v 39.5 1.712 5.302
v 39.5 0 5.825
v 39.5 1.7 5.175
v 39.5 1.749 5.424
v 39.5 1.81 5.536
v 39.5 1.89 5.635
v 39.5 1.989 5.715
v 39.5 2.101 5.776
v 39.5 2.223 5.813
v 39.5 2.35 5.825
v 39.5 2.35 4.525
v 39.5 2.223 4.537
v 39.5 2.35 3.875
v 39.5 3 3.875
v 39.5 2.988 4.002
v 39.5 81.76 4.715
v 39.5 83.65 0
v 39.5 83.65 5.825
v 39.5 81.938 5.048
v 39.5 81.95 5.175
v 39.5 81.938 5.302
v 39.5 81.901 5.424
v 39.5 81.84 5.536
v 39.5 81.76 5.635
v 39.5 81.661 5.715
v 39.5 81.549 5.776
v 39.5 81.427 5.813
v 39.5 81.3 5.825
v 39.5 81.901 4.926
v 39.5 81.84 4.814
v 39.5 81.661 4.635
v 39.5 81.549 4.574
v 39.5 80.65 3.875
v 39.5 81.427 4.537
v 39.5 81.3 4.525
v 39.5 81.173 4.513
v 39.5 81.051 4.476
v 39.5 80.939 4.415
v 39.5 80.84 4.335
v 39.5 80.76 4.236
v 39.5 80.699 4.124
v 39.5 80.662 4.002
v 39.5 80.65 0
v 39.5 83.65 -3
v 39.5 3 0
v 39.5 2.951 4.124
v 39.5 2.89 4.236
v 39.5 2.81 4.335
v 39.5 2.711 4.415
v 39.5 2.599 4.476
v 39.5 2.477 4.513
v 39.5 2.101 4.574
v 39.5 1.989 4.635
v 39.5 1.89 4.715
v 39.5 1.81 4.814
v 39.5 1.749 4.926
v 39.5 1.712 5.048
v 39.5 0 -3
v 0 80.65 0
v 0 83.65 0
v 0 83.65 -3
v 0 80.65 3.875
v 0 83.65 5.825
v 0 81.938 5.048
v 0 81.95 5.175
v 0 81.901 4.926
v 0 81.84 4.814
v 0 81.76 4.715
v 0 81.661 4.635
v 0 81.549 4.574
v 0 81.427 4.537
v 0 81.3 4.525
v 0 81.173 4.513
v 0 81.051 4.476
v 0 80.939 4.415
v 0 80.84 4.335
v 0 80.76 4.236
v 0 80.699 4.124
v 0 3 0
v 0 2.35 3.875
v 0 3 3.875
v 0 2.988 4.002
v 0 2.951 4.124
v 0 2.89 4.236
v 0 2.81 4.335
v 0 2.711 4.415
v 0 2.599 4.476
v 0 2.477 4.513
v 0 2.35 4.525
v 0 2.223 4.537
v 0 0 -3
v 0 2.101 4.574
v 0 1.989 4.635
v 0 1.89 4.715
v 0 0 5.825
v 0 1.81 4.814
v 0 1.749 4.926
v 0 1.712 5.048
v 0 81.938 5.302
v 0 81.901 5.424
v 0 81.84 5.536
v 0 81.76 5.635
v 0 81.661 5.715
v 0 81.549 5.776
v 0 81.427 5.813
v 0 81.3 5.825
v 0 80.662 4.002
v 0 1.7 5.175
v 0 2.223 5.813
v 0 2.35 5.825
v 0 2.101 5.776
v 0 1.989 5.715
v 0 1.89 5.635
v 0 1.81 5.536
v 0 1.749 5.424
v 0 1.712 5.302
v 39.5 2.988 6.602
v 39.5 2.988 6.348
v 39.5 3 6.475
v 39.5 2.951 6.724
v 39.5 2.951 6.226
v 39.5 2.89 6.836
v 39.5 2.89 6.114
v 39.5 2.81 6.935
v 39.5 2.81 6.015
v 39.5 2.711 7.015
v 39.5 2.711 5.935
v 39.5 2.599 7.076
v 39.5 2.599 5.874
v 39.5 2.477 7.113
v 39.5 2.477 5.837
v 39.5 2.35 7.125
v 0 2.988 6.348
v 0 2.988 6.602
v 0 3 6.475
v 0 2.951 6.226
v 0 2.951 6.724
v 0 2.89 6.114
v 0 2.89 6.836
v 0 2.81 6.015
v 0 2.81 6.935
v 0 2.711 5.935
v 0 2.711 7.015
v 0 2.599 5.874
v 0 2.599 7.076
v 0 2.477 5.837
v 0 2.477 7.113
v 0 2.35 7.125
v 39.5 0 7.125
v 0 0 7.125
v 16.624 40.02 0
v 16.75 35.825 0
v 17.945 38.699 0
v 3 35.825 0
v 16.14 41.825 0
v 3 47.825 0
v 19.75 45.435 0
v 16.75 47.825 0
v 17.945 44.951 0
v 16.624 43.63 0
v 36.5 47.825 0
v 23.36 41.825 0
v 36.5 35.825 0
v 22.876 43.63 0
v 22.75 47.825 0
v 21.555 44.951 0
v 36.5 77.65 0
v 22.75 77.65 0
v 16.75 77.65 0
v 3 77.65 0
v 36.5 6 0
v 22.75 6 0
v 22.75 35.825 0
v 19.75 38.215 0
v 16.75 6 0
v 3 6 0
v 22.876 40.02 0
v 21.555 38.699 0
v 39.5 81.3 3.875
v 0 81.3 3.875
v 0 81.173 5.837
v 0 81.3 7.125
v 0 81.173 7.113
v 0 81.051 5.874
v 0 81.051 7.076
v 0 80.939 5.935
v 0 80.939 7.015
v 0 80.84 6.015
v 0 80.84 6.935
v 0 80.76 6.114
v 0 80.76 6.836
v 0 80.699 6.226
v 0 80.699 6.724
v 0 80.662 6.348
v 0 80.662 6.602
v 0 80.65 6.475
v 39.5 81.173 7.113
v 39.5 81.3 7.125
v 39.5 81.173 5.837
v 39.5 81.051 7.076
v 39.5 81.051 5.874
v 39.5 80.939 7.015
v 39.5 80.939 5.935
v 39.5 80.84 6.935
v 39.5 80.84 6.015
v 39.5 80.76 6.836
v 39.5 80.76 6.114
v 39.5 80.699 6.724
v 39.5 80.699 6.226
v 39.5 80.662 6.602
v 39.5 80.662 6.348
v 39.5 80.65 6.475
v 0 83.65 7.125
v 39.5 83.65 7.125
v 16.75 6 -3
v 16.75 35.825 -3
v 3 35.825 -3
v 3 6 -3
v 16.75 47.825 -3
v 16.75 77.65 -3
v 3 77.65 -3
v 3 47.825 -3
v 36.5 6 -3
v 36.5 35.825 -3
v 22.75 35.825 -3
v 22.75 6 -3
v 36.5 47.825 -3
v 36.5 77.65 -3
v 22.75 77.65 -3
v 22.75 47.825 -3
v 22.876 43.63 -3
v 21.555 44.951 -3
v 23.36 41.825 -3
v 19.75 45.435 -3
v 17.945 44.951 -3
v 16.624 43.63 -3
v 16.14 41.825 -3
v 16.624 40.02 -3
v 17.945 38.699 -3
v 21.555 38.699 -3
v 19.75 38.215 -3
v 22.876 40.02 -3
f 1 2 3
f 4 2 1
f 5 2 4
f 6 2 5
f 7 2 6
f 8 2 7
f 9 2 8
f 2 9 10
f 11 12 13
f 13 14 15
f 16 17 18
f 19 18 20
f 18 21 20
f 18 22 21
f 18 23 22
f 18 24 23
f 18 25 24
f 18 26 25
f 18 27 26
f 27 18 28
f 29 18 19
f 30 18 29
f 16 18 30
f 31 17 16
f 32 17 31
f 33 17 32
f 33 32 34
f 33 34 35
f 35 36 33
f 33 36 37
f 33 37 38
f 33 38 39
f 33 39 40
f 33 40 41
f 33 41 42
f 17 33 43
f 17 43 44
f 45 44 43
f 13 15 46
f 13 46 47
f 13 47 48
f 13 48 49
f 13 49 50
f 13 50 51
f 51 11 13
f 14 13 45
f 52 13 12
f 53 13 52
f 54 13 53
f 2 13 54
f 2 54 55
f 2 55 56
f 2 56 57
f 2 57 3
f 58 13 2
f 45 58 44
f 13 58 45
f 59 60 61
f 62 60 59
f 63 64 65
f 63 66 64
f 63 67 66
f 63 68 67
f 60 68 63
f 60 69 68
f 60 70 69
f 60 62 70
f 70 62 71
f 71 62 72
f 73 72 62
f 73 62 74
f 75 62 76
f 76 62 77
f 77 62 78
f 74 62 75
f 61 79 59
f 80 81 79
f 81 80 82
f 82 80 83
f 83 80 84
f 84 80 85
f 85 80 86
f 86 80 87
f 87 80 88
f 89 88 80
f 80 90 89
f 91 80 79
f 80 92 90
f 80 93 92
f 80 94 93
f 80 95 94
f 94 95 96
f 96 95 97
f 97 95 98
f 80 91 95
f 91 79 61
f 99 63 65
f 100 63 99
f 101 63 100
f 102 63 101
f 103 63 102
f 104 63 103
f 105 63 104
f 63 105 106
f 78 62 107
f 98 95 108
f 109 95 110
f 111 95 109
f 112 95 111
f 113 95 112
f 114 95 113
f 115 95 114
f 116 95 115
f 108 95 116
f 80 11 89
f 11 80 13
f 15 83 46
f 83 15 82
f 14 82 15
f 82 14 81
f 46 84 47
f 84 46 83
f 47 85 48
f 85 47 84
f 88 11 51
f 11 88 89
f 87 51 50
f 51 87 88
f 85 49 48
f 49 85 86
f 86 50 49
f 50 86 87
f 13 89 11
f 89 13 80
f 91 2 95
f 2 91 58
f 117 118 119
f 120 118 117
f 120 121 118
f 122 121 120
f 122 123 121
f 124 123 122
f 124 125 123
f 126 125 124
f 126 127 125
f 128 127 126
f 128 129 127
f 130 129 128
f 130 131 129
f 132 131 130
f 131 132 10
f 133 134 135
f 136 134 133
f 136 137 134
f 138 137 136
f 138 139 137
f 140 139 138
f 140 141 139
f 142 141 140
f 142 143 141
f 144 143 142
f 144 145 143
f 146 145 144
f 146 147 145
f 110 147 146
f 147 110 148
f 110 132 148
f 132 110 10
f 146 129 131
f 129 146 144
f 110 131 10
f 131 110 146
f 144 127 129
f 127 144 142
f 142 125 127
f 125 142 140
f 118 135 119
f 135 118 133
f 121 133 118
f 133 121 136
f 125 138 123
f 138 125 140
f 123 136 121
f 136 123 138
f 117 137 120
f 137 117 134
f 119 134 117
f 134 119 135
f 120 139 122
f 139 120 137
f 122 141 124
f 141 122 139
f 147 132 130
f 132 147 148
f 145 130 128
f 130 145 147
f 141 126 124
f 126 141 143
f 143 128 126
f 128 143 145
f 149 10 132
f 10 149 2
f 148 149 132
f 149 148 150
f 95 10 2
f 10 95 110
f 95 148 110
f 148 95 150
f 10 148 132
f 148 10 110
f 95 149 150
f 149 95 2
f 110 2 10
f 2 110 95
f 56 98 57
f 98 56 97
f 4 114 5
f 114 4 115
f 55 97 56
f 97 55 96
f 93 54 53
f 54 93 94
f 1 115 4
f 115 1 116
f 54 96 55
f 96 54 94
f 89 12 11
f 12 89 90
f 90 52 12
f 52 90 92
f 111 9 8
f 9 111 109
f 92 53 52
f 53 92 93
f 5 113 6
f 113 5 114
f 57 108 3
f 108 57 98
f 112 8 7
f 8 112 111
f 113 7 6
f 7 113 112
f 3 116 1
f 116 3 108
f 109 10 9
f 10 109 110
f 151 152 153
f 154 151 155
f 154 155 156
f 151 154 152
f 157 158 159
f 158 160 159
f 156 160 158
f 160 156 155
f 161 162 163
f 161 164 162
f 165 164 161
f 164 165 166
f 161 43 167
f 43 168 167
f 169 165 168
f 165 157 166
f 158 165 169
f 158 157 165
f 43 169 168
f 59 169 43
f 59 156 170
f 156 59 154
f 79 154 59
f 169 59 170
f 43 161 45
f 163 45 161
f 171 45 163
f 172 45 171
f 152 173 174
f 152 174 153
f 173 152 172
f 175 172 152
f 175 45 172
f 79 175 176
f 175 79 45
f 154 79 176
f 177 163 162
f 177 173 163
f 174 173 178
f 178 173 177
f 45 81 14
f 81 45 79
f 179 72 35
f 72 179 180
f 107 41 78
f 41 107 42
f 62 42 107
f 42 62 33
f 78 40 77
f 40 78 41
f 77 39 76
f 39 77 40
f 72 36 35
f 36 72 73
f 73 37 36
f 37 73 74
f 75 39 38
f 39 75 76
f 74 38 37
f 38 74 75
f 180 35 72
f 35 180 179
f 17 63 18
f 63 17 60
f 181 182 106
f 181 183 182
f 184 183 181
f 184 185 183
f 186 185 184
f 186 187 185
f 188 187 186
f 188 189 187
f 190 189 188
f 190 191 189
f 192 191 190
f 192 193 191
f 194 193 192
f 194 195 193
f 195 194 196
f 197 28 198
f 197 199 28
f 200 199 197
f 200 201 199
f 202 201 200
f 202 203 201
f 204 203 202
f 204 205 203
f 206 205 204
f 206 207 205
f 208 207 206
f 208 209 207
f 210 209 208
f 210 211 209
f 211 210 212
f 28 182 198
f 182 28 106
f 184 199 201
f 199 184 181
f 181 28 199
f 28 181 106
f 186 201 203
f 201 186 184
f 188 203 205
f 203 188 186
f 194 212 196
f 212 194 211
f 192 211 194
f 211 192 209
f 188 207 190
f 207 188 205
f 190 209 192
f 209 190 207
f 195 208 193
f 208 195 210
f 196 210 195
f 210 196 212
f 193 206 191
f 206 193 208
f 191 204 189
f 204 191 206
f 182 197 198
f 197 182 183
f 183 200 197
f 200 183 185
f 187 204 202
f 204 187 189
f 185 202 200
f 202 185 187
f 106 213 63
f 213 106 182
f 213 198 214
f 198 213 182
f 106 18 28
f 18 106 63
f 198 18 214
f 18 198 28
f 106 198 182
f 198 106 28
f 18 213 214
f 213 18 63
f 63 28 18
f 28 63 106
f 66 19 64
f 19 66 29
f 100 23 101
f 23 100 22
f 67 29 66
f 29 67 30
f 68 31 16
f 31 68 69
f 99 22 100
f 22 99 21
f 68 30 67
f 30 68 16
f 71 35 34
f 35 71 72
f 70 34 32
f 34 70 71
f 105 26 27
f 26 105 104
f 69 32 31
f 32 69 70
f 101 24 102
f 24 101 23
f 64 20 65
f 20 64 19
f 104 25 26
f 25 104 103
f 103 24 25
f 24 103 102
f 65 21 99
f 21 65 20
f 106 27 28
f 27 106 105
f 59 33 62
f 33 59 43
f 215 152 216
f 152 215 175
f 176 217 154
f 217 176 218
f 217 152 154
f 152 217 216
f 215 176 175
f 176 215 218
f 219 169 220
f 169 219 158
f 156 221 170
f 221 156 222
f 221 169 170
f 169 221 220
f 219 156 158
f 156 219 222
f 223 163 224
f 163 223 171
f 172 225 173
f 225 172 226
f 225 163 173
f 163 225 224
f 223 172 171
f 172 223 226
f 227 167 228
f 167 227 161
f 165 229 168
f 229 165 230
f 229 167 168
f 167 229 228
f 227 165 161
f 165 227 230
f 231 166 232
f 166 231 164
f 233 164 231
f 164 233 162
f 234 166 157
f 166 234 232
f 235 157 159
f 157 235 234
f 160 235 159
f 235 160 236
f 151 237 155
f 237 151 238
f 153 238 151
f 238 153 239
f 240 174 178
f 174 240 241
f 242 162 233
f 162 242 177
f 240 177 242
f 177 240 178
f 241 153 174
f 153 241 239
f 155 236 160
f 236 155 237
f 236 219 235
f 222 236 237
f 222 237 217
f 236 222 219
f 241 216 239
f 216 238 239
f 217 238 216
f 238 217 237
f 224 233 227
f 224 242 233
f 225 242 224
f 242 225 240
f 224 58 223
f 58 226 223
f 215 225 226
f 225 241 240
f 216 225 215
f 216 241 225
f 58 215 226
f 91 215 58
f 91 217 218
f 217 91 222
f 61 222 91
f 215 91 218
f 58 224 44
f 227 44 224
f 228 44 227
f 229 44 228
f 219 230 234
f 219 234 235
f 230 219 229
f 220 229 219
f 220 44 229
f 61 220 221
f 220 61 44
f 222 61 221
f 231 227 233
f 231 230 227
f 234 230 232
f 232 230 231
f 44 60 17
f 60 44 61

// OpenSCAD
// file: Library-Shapes.scad
//roundedcorner(4, 10);
//roundedbox(65,45,4, 8);
//roundedshelf(65, 45, 4);
//roundedgroove(65, 3, 2);
//groovedwall(length=45, height=9, thickness=3, groovedepth=4.5);
protrudinghookwall(walllength=45, wallheight=19, wallthickness=3, hooksize=2);

module roundedcorner(height, radius)
{
	intersection()
	{
		cube(size=[radius, radius, height]);
		color([1,0,0]) cylinder(h=height, r=radius, $fn=32);
	}
}

module roundedbox( length, width, height, radius)
{
	strutlength = length - radius*2;
	strutwidth = width - radius*2;

	translate([length-radius, width-radius, 0]) rotate([0,0,0]) roundedcorner(height, radius);

	translate([radius, width-radius, 0]) rotate([0,0,90]) roundedcorner(height, radius);
	
	translate([radius, radius, 0]) rotate([0,0,180]) roundedcorner(height, radius);
	
	translate([length-radius, radius, 0]) rotate([0,0,270]) roundedcorner(height, radius);

	// Connect corners with filler rectangles
	translate([radius, width-radius,0]) cube(size=[strutlength, radius, height]);
	translate([radius, 0,0]) cube(size=[strutlength, radius, height]);
	translate([0, radius, 0]) cube(size=[radius,strutwidth,height]);
	translate([length-radius, radius, 0]) cube(size=[radius,strutwidth,height]);

	// Fill in the center rectangle
	translate([radius, radius,0]) cube(size=[strutlength, strutwidth, height]);
}

module roundedshelf(length, width, height)
{
	rotate([0,90,0]) 
	translate([-height/2,width-(height/2),0])
	union()
	{
		roundedcorner(length, height/2);
		rotate([0,0,90]) roundedcorner(length, height/2);
	}

	cube(size=[length, width-height/2, height]);
}

module roundedgroove(length, width, height)
{
	difference()
	{
		union()
		{
			roundedshelf(length, width, height/3);
			translate([0,0,height/3]) cube(size=[length, width-height/3/2, height/3]);
			translate([0,0,(height/3)*2]) roundedshelf(length, width, height/3);
		}

		// subtract a cylinder to make the smooth bottom of the track
		rotate([0,90,0]) 
		translate([-(height/3)-(height/3)/2,width-height/3/2,-0.25]) 
			cylinder(h=length+0.5, r=(height/3)/2, $fn=32);
	}
}


// Walls
module groovedwall(length, height, thickness, groovedepth)
{
	lowerwallheight = height - groovedepth + groovedepth/3/2;
	
	union()
	{
	// place the lower wall
	color([0,0,1]) cube(size=[length, thickness, lowerwallheight]);
	
	// Place the grooved portion
	translate([0,0,height-groovedepth])
	roundedgroove(length, thickness, groovedepth);
	}
}

module protrudinghookwall(walllength, wallheight, wallthickness, hooksize)
{
	lowerwallheight = wallheight - hooksize *2;

	difference()
	{
		union()
		{
		// place the wall
		color([0,0,1]) cube(size=[walllength, wallthickness, wallheight]);
		
		
		// place the hook cyclinder
		color([1,0,0])
		translate([0, wallthickness, wallheight-(hooksize/2)])
		rotate([0,90,0])
		cylinder(r=hooksize/2, h=walllength, $fn=6);
		}

		// subtract the undercut
		translate([-0.25
, wallthickness, wallheight-(hooksize/2)-hooksize])
		rotate([0,90,0])
		cylinder(r=hooksize/2, h=walllength+0.5, $fn=6);
	}
}
// main file
use <Library-Shapes.scad>

// The following are a couple of templates to create harnesses for well known pcbs
// comment out the one you want, or create a new one.
// The 'length' is the length of the board, connected to the harness
// the 'width' is the other dimension
// You can leave the others as is, or alter, and experiment to suit your needs

// Gumstix Overo Summit expansion board
pcbholder( length = 39.5, width = 80.25, bottomclearance= 4, pcbthickness=1.25, slotdepth=2, grooveclearance=1.3);

// Arduino Duemilanove - Also works with standard Arduino shields
//pcbholder( length = 66, width = 54, bottomclearance= 3, pcbthickness=2, //slotdepth=2, grooveclearance=1.3);

// Arduino MEGA - Also works with standard Arduino shields
//pcbholder( length = 100, width = 54, bottomclearance= 3, pcbthickness=2, slotdepth=2, grooveclearance=1.3);

//LeafLabs Maple - Shorter than an Arduino
//pcbholder( length = 53, width = 54, bottomclearance= 3, pcbthickness=2, slotdepth=2, grooveclearance=1.3);

// Web Platform v1c - http://www.dangerousprototypes.com
//pcbholder( length = 50.5, width = 88.5, bottomclearance= 3, pcbthickness=2, slotdepth=2, grooveclearance=1.3);

// Battery Charger - http://www.adafruit.com (usb/dc adjustable LiPo charger
//pcbholder( length = 40.9, width = 44.5, bottomclearance= 3, pcbthickness=2, slotdepth=2, grooveclearance=1.3);

// LPC1343 Reference - http://www.microbuilder.eu
//pcbholder( length = 95.3, width = 70.5, bottomclearance= 3, pcbthickness=2, slotdepth=2, grooveclearance=1.3);

// Parallax Propeller demo Rev g 2008 - http://www.parallax.com
//pcbholder( length = 76.5, width = 76.5, bottomclearance= 3, pcbthickness=2, slotdepth=2, grooveclearance=1.3);

// Bus Pirate BPv3 - http://www.dangerousprototypes.com
//pcbholder( length = 52, width =29.5, bottomclearance= 3, pcbthickness=2, slotdepth=2, grooveclearance=1.3);

//RFBee v1.1 - http://www.seeedstudio.com
//pcbholder( length = 25, width =27, bottomclearance= 7, pcbthickness=1, slotdepth=2, grooveclearance=1.3);




//
// Routines in this library
//
module pcbholdersingleholestencil(length, width, basethickness, wallthickness, holeradius)
{
	radius = 7.22/2;
	borderwidth = wallthickness;
	rectwidth = width/2.0 - borderwidth*4 ;
	rectlength = length/2.0 - borderwidth*2;


	// Subtract large rectangular chunks
	translate([borderwidth, borderwidth*2, -0.25])
		cube(size=[rectlength, rectwidth, basethickness+0.5]);

	translate([borderwidth, width/2 + borderwidth*2, -0.25])
		cube(size=[rectlength, rectwidth, basethickness+0.5]);


	translate([length - borderwidth-rectlength, borderwidth*2, -0.25])
		cube(size=[rectlength, rectwidth, basethickness+0.5]);

	translate([length - borderwidth-rectlength, borderwidth*2+width/2.0, -0.25])
		cube(size=[rectlength, rectwidth, basethickness+0.5]);

	// Remove the center hole
	translate([length/2, width/2.0, -0.25])
		cylinder(h = basethickness+0.5, r=holeradius, $fn = 12);

		//translate([length/2, width/2+wallextent,0])
			//cylinder(h=basethickness, r= holeradius+1.5);

}

// Create the base, with stencils cutout
module pcbholderbase(length, width, basethickness, wallthickness, grooveclearance)
{
	wallextent = wallthickness - grooveclearance;
	basewidth = width+wallextent*2;
	holeradius = 7.22/2;

	union()
	{
		difference()
		{
			// Start with a basic flat surface
			cube(size=[length,basewidth, basethickness]);
	
			// cutout stencil
			pcbholdersingleholestencil(length, basewidth, basethickness, wallthickness, holeradius);
		}
	
	}
}

// Main routine to generate a holder
module pcbholder(length, width, bottomclearance, pcbthickness, grooveclearance)
{
	wallthickness = 3;
	basethickness = 3;
	wallextent = wallthickness - grooveclearance;
	basewidth = width+wallextent*2;

	// Wall	
	groovedwall(length,  bottomclearance+pcbthickness*2.5, wallthickness, groovedepth=grooveclearance*3); 

	// Wall
	rotate([0,0,180])
	translate([-length,-basewidth,0]) 
		groovedwall(length,  bottomclearance+pcbthickness*2.5, wallthickness, groovedepth=grooveclearance*3); 
	

	// Base
	translate([0, 0, -basethickness])
		pcbholderbase(length, width, basethickness, wallthickness, grooveclearance);
}
